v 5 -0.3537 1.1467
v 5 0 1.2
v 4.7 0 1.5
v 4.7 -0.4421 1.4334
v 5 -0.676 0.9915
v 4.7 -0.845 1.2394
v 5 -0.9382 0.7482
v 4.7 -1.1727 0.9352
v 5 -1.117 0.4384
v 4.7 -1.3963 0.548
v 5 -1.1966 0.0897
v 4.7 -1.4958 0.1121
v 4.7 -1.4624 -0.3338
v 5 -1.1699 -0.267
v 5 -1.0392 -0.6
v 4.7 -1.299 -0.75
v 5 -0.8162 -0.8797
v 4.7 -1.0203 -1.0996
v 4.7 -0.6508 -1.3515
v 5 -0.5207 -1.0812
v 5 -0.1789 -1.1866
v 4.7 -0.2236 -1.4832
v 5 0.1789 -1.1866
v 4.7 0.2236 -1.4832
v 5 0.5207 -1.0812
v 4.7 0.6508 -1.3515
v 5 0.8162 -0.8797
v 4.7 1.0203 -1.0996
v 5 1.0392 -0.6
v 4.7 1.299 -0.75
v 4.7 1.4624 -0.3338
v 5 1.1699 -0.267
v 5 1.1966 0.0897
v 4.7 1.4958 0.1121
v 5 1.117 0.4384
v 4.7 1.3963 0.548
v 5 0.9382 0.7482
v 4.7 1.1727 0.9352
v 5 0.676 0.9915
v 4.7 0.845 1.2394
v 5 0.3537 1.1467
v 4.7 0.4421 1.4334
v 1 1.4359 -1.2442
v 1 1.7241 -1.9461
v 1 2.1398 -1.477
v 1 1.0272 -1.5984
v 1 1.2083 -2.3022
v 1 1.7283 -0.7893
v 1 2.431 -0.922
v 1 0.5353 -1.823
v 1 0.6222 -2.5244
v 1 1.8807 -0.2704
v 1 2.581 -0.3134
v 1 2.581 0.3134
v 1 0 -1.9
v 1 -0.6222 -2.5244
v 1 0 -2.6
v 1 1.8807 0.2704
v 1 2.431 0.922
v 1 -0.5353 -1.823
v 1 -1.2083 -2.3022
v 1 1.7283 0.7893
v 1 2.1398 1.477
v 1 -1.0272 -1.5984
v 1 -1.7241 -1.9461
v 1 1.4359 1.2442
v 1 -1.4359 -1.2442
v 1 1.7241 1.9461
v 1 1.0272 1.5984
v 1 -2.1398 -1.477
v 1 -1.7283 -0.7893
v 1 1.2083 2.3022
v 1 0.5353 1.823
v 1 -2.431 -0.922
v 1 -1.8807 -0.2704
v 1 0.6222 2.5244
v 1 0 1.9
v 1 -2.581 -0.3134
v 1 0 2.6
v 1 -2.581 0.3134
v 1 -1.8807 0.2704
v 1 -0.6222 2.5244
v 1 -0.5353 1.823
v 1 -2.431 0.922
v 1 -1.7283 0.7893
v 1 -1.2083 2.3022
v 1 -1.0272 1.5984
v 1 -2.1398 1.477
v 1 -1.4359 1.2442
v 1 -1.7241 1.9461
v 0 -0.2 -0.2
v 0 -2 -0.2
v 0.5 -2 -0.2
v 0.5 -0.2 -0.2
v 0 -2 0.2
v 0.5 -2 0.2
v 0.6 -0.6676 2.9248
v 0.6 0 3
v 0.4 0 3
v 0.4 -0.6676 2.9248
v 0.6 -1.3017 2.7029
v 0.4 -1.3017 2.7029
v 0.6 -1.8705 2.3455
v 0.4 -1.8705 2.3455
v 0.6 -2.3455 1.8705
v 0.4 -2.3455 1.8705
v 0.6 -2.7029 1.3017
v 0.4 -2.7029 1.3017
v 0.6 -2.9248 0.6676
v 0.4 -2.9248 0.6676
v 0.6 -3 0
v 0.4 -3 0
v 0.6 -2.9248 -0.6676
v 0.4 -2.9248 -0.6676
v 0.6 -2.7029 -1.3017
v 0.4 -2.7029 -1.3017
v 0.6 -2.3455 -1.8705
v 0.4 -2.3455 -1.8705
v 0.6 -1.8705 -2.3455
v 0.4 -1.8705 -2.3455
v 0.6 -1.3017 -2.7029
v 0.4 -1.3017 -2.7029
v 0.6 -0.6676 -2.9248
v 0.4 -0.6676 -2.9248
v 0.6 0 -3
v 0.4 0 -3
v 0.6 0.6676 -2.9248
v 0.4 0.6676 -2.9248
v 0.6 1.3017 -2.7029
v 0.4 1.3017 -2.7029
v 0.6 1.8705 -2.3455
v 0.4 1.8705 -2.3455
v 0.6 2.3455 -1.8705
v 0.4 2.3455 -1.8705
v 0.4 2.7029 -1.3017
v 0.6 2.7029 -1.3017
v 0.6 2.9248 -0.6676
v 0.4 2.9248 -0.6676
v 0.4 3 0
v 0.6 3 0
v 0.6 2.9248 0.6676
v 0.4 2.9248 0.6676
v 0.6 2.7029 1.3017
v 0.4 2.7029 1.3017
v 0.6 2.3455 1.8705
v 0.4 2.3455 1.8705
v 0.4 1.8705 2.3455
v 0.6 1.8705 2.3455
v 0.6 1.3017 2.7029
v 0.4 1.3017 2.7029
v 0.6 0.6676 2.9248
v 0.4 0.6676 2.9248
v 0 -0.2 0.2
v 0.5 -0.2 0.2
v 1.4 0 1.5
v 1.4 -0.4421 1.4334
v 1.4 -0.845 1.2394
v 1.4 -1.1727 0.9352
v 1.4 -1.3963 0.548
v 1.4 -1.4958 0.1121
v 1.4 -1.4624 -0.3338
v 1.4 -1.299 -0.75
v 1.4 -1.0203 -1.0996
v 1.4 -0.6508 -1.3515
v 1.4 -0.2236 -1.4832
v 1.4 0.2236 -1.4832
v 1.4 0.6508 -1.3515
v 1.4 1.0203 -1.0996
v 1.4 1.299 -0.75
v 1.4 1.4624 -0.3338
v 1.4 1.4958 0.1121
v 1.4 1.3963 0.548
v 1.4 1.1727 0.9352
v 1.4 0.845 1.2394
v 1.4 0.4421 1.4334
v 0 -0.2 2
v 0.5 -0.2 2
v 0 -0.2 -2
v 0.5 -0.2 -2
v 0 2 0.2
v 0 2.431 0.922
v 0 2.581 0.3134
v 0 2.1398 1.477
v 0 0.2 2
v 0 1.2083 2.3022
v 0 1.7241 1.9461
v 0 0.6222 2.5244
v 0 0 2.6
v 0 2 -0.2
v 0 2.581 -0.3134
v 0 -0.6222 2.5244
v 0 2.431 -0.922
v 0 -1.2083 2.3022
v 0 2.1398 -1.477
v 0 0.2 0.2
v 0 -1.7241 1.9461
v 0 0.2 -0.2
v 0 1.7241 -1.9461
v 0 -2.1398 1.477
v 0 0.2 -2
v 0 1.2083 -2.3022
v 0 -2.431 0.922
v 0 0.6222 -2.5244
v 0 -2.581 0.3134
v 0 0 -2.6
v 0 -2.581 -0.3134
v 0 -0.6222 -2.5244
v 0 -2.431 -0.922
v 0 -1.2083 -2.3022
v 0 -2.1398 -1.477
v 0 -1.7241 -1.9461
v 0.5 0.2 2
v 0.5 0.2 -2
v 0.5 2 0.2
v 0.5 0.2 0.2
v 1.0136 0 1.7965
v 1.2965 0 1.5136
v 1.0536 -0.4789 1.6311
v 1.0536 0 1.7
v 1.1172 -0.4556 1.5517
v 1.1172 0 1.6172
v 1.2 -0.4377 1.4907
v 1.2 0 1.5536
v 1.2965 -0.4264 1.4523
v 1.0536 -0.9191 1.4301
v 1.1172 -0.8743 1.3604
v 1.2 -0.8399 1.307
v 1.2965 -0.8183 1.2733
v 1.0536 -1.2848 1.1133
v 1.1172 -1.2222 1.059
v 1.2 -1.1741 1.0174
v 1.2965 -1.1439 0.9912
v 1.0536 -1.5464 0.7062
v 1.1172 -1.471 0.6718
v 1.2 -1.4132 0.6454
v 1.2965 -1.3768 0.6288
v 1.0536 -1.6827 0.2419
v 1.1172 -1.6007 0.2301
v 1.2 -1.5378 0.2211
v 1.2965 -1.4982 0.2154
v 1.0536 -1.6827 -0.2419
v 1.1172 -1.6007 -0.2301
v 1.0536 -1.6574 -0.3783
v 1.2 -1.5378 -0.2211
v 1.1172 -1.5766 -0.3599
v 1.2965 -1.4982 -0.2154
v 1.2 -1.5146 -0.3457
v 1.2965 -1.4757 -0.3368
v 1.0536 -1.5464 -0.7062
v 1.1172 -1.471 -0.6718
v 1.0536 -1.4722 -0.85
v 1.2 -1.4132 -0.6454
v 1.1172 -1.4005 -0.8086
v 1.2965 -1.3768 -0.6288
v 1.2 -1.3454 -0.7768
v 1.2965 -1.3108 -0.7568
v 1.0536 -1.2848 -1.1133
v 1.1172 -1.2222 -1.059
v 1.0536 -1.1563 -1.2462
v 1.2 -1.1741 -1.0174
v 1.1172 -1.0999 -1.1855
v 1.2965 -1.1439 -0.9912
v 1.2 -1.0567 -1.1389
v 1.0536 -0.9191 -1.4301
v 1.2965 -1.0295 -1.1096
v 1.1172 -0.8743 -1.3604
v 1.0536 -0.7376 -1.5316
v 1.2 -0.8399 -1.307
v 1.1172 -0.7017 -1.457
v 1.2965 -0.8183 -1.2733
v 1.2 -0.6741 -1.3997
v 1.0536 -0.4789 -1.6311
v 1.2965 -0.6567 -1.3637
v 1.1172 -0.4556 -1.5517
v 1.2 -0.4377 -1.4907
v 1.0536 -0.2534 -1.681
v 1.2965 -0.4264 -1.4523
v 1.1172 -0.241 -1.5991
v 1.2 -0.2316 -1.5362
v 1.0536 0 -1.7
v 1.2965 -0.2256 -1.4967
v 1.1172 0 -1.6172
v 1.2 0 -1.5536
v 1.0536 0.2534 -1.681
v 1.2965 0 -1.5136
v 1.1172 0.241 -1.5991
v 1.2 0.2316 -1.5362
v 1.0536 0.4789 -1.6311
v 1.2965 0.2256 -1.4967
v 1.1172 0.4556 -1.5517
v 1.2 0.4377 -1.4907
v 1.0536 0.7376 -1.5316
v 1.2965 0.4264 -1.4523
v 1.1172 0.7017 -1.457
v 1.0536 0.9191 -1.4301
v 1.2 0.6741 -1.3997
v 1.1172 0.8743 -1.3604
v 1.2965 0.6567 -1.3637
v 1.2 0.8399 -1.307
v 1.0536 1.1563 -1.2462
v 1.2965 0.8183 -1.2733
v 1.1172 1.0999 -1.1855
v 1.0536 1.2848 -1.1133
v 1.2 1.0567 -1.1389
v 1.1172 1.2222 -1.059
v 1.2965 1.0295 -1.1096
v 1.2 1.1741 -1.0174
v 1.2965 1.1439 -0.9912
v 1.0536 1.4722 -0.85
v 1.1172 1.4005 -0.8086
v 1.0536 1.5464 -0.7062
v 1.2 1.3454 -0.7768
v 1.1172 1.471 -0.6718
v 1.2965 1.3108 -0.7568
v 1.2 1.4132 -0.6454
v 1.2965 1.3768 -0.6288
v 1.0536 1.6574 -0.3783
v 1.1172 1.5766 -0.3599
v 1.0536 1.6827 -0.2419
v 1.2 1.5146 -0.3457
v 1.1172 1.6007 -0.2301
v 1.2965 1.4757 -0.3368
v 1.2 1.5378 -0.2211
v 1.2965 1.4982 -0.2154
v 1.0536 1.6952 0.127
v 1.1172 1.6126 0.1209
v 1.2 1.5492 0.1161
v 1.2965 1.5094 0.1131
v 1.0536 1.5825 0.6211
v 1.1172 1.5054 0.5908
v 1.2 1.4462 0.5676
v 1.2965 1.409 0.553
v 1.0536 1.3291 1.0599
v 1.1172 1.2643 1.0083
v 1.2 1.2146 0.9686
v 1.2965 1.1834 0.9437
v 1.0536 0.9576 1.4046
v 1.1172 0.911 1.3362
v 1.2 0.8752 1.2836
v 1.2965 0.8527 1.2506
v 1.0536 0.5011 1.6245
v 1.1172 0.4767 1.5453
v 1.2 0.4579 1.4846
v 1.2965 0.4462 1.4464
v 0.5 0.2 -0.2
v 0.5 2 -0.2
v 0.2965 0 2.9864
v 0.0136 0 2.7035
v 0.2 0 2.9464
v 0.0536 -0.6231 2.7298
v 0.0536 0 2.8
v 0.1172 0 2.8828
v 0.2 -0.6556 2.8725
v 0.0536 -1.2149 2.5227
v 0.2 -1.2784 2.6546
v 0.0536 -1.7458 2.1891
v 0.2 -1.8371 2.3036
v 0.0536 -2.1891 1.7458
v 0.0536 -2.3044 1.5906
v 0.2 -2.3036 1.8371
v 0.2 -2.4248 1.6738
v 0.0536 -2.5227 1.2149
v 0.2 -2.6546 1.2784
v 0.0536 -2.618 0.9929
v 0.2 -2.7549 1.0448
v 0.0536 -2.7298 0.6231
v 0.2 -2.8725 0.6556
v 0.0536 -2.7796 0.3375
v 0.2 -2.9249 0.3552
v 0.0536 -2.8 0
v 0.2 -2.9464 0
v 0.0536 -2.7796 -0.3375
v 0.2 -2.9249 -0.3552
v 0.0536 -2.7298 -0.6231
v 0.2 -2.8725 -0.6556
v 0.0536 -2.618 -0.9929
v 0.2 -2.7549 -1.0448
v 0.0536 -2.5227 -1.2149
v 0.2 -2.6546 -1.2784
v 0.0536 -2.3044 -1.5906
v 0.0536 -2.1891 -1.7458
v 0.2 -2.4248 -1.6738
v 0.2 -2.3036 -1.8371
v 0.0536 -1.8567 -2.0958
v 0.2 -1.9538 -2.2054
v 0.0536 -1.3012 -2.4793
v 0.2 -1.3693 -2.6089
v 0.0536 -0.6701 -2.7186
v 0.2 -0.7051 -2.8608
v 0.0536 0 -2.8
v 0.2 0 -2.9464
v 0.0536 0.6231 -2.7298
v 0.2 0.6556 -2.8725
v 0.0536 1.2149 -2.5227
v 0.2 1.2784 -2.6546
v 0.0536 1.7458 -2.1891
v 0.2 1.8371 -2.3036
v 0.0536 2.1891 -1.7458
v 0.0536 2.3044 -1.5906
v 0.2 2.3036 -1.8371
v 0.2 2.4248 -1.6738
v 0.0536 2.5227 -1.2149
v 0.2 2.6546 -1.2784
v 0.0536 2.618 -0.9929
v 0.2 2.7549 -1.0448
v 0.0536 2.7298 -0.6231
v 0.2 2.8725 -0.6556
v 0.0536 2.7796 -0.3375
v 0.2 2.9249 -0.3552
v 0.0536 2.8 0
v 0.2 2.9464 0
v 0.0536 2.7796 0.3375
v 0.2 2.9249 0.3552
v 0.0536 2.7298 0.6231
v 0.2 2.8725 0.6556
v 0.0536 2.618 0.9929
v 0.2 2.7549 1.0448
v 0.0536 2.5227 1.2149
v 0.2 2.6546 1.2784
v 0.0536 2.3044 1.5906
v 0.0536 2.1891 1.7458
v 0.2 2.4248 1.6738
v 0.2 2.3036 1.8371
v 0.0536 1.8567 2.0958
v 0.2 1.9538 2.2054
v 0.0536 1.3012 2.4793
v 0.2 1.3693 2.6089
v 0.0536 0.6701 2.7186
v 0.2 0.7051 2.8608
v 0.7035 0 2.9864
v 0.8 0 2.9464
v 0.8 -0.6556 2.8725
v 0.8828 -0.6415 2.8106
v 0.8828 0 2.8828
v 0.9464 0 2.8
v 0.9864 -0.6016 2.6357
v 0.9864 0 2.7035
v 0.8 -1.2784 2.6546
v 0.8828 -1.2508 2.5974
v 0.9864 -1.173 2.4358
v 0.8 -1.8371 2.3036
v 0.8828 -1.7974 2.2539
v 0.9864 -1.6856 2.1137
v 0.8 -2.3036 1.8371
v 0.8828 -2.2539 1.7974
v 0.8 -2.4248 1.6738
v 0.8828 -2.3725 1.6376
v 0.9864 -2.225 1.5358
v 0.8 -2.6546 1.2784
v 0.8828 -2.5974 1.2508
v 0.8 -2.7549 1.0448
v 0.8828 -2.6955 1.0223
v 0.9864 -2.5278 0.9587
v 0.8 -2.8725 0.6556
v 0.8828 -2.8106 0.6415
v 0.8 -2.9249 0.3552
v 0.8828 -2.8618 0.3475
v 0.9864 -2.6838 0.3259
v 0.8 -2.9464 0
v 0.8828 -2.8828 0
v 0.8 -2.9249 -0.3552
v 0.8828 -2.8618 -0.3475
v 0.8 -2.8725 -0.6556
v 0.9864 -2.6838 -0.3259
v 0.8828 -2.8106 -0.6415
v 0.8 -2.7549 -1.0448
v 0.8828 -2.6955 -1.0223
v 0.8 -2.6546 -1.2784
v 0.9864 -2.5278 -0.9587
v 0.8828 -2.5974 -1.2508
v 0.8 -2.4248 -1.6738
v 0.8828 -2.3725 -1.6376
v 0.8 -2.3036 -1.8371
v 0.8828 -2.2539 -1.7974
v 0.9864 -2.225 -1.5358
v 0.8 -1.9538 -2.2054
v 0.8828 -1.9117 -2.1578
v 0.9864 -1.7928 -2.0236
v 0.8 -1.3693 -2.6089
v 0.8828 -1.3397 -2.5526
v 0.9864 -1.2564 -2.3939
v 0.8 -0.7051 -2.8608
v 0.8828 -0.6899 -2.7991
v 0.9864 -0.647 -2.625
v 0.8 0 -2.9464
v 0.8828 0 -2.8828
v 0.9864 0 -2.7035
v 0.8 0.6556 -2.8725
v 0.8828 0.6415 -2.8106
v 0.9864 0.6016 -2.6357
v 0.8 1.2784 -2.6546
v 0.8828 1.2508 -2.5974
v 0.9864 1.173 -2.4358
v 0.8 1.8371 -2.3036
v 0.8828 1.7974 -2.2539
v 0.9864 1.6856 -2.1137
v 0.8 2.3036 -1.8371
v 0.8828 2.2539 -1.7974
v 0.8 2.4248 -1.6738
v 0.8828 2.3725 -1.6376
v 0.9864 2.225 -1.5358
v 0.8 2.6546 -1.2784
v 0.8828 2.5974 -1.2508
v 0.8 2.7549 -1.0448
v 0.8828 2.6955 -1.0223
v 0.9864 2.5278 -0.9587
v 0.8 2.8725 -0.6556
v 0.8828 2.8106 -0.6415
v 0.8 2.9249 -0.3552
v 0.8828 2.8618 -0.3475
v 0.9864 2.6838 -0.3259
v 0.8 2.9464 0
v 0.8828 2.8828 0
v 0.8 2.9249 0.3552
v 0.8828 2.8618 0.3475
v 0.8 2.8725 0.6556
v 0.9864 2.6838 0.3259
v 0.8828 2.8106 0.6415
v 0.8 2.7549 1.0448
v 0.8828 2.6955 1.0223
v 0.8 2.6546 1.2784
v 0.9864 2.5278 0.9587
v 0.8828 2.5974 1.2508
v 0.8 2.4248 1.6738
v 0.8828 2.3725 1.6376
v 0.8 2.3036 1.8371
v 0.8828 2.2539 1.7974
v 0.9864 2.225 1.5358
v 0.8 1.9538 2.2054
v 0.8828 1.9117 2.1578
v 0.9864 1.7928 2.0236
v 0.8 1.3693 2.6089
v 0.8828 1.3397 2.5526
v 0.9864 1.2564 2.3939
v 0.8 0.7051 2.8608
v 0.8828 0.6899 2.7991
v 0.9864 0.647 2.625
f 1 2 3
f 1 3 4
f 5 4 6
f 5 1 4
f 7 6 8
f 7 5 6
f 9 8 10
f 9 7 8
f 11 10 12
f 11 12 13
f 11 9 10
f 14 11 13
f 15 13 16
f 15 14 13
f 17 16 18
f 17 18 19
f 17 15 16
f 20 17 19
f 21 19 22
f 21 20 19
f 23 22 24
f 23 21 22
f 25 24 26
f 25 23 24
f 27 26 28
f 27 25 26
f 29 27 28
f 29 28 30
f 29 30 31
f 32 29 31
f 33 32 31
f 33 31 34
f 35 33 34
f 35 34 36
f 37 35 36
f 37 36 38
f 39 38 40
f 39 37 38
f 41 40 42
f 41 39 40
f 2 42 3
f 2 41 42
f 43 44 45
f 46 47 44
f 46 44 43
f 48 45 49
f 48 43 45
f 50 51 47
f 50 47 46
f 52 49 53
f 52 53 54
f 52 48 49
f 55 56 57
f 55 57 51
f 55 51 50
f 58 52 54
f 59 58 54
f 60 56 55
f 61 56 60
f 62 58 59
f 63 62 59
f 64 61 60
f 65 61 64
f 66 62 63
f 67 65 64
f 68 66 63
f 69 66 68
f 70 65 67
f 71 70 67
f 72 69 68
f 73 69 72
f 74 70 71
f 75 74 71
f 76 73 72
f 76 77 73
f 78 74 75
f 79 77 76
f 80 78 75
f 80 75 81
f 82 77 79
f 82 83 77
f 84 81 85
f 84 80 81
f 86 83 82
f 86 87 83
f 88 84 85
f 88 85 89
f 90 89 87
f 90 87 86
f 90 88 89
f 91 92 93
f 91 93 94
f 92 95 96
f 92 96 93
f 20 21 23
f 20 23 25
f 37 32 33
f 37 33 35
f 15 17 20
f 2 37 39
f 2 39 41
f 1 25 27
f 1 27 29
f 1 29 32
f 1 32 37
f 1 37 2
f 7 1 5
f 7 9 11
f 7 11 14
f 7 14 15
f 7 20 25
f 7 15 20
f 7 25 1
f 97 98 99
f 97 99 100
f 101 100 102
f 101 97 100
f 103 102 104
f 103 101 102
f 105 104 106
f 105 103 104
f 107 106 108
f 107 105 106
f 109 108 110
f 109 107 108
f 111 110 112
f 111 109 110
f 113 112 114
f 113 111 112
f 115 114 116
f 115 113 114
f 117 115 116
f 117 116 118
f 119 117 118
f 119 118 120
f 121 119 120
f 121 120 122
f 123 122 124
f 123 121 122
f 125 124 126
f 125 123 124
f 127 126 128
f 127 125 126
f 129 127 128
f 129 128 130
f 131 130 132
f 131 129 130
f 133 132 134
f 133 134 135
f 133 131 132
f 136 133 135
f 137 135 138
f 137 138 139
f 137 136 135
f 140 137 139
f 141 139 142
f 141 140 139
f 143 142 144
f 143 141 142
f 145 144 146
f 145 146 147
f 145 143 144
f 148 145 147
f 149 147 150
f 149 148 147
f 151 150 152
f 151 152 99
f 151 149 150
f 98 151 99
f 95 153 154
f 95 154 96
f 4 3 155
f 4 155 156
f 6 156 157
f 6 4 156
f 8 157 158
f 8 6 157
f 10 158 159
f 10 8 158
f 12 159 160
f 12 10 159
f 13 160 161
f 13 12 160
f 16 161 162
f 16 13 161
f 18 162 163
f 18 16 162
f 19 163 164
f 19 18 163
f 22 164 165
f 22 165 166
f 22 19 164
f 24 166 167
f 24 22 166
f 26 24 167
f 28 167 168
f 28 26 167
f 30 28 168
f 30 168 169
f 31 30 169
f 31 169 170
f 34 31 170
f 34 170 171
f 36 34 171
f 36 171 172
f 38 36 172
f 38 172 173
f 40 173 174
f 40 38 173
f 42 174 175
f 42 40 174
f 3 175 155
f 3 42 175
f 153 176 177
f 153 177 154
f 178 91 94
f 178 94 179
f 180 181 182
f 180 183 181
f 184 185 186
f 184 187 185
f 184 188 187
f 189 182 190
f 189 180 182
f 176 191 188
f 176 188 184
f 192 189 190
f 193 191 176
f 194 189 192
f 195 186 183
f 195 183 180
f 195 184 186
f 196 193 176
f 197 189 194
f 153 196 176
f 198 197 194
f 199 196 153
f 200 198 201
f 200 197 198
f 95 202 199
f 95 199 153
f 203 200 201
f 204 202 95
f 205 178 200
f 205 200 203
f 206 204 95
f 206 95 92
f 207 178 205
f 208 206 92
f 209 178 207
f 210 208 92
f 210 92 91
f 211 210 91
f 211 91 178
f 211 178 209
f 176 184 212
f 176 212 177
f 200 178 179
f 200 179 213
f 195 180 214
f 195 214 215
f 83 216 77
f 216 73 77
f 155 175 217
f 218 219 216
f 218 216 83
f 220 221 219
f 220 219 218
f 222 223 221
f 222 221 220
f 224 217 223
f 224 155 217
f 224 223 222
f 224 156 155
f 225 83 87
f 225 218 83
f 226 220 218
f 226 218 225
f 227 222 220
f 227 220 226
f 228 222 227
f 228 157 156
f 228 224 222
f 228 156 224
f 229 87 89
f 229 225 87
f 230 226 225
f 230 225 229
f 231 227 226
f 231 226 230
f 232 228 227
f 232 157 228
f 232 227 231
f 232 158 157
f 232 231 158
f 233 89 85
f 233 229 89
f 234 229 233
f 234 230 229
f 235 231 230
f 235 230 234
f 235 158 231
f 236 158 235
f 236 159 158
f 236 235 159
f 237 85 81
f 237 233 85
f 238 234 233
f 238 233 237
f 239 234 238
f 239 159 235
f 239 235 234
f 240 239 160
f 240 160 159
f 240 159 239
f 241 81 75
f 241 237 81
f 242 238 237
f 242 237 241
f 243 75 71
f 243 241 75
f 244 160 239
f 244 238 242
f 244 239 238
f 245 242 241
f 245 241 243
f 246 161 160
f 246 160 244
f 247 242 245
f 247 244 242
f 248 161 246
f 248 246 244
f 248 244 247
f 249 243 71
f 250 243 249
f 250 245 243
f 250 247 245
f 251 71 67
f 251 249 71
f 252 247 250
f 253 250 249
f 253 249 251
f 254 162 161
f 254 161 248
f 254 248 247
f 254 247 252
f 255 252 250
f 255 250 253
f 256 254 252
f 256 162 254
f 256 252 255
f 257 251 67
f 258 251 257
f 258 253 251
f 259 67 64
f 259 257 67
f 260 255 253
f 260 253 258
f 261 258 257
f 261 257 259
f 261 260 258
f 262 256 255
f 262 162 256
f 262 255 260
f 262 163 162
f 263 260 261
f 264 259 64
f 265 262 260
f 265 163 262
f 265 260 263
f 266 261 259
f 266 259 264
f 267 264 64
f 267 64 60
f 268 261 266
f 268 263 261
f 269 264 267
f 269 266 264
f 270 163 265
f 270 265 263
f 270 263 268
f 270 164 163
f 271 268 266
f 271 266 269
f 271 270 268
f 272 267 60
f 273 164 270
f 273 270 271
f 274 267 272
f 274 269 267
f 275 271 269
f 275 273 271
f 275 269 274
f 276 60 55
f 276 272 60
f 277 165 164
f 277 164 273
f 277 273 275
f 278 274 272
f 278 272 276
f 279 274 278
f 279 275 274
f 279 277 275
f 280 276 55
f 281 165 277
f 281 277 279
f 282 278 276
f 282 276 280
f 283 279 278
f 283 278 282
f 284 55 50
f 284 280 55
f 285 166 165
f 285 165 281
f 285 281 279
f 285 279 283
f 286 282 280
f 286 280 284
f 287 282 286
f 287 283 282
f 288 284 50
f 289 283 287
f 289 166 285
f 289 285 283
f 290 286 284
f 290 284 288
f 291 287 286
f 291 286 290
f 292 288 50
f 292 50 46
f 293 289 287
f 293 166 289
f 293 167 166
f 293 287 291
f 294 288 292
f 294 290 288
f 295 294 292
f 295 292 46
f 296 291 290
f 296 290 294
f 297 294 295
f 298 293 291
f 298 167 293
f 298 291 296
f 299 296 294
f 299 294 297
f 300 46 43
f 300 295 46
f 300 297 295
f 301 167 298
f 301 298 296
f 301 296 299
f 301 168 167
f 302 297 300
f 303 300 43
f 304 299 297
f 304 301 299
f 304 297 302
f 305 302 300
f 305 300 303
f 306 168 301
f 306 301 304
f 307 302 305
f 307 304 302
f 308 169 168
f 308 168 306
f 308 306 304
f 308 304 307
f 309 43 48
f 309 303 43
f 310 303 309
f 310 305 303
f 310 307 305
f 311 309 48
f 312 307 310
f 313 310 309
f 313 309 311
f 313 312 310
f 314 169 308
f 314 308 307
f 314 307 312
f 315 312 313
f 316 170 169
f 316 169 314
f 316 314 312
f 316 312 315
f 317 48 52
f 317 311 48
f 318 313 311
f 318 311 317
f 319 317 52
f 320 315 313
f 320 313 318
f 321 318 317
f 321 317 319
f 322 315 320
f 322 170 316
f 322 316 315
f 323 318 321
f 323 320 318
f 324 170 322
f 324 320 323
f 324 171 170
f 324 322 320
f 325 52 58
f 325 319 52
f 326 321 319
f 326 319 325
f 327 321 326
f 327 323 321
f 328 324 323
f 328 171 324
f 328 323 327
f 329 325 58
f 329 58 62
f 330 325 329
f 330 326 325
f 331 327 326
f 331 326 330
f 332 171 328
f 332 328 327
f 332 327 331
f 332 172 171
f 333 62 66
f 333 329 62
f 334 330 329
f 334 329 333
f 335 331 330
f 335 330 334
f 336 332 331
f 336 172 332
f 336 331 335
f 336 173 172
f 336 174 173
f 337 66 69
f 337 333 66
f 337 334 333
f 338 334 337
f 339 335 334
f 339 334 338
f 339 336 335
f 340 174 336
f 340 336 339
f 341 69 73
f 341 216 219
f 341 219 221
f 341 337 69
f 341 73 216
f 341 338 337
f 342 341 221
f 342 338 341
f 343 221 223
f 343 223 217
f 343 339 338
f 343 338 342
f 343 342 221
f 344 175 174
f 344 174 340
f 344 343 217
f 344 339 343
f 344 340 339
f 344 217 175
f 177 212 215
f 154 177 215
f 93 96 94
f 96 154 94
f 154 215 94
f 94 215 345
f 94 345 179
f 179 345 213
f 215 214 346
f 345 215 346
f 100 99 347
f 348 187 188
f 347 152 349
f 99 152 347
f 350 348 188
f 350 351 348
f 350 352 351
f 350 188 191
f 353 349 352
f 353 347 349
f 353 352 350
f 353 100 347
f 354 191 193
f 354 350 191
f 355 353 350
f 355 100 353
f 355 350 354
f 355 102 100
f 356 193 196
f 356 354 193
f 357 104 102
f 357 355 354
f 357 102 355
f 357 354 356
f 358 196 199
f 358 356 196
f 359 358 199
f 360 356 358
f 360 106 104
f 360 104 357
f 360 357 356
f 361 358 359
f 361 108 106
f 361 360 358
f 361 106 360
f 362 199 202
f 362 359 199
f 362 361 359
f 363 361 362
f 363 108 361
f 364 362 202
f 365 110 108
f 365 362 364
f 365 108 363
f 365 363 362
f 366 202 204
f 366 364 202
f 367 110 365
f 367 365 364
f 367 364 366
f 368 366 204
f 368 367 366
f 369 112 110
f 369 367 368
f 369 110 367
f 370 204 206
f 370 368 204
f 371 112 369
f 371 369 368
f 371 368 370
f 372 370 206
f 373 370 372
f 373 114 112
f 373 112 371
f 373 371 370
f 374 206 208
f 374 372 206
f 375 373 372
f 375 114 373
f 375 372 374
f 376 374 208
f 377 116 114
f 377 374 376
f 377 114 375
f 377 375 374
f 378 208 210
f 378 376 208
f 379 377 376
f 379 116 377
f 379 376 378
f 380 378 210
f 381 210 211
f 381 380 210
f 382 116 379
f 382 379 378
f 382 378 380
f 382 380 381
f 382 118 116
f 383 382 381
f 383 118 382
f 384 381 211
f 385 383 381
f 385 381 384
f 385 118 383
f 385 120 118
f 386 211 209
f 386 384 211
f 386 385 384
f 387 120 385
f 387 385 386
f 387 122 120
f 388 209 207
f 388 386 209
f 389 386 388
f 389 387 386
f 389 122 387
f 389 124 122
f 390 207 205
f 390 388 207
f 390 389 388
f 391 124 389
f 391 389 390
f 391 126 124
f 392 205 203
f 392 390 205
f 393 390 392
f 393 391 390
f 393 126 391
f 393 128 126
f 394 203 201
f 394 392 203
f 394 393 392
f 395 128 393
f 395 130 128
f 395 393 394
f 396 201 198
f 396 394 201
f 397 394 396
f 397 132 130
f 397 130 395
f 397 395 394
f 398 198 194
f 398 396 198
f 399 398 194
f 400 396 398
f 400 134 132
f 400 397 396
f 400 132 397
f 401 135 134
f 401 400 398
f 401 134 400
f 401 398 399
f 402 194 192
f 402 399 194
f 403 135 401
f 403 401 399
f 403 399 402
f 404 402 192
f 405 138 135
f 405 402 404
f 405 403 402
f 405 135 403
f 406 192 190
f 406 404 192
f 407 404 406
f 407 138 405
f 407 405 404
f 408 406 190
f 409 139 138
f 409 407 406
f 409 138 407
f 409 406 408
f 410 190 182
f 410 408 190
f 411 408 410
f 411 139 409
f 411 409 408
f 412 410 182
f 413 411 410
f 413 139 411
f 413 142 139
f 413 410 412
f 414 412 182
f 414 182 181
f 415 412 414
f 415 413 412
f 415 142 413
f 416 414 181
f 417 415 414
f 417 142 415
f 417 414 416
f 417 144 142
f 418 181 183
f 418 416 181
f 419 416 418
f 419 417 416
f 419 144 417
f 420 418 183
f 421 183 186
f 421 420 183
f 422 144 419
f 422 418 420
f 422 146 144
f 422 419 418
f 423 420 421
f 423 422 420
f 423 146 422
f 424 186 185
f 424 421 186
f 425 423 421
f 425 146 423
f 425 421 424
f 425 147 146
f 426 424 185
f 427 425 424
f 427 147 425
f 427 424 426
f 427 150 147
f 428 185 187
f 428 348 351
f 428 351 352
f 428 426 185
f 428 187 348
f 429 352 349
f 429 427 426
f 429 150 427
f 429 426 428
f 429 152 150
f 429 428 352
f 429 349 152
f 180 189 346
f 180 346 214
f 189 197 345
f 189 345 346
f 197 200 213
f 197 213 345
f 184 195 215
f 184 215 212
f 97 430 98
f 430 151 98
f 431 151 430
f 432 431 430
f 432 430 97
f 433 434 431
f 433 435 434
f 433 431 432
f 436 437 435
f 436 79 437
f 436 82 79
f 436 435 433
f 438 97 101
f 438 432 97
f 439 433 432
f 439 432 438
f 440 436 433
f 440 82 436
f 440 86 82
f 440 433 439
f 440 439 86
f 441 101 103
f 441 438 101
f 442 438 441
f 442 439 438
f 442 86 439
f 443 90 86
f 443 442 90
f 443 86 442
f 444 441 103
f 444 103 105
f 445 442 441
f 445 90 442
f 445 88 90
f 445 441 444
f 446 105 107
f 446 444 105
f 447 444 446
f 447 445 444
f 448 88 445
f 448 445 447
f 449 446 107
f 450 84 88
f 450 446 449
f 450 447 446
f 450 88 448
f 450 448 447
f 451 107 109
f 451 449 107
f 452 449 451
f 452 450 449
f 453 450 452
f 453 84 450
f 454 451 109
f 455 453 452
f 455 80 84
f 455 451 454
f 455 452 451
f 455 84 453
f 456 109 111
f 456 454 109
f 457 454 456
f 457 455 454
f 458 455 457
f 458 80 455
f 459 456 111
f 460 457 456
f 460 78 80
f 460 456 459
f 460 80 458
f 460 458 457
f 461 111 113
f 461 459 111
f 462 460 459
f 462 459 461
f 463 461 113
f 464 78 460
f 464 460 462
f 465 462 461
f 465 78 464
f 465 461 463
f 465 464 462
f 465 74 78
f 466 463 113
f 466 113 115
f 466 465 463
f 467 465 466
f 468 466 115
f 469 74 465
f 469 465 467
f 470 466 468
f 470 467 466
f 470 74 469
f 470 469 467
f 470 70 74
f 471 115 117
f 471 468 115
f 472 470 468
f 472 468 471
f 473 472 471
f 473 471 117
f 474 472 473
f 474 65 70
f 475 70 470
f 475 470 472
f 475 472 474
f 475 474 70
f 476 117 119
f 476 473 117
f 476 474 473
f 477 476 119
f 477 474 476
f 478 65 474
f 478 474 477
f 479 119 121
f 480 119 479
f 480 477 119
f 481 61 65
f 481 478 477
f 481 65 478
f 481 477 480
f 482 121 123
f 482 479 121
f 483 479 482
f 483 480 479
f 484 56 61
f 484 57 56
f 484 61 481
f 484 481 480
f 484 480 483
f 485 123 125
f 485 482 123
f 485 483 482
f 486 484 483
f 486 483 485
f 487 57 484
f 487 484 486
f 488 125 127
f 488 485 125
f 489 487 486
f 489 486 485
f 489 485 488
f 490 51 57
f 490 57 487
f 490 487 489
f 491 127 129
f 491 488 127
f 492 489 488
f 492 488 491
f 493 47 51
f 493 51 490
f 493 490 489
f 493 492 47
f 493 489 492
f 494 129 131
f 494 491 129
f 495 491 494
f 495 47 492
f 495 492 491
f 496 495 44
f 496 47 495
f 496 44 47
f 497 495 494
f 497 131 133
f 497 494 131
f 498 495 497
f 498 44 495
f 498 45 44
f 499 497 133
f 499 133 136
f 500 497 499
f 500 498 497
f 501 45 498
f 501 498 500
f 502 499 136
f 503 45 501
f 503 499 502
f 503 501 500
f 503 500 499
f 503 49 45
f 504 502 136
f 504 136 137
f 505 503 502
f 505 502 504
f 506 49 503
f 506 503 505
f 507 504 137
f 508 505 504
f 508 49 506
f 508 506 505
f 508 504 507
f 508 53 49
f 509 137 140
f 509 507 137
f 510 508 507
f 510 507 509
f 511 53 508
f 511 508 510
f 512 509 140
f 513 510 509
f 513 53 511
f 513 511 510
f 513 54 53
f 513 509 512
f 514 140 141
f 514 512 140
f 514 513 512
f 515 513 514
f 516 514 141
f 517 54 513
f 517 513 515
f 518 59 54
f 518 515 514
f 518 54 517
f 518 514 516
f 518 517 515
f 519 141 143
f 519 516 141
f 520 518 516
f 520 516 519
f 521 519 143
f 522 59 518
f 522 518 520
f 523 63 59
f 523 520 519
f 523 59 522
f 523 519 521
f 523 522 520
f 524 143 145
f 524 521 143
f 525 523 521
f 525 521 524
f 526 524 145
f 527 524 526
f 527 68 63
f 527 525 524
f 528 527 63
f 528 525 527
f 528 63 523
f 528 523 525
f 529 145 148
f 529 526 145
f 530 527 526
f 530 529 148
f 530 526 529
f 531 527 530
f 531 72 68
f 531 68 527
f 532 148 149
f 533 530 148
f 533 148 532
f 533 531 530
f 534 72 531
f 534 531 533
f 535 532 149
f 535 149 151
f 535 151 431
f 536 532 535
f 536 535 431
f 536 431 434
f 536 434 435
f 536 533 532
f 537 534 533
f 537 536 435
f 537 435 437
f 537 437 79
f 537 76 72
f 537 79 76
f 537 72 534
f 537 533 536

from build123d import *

# Parameters (mm, degrees)
FILLET_1_R          = 0.4
CUT_EXTRUDE_1_DEPTH = 0.5
CHAMFER_1_SIZE      = 0.3


with BuildPart() as part:
    # Эскиз1 → Повернуть1 (revolve)
    with BuildSketch(Plane.XY, mode=Mode.PRIVATE) as revolve_1_sk:
        Polygon((0, 0), (0, 3), (1, 3), (1, 1.5), (5, 1.5), (5, 0), align=None)
    revolve(revolve_1_sk.sketch.rotate(Axis((-40.588436676, 0, 0), (1, 0, 0)), 90), axis=Axis((-40.588436676, 0, 0), (1, 0, 0)))

    # Скругление1
    fillet_1_edges = [part.edges().sort_by_distance(p)[0] for p in [
        (1, 0, -1.5),
        (1, 0, -3),
        (0, 0, -3),
    ]]
    fillet(fillet_1_edges, radius=FILLET_1_R)

    # Эскиз2 → Вырез-Вытянуть1 (cut)
    with BuildSketch(Plane.ZY):
        Polygon((0.2, -2), (-0.2, -2), (-0.2, -0.2), (-2, -0.2), (-2, 0.2), (-0.2, 0.2), (-0.2, 2), (0.2, 2), (0.2, 0.2), (2, 0.2), (2, -0.2), (0.2, -0.2), align=None)
    extrude(amount=-CUT_EXTRUDE_1_DEPTH, mode=Mode.SUBTRACT)

    # Фаска1
    chamfer_1_edges = [part.edges().sort_by_distance(p)[0] for p in [
        (5, 0, -1.5),
    ]]
    chamfer(chamfer_1_edges, length=CHAMFER_1_SIZE)


solid = part.part
